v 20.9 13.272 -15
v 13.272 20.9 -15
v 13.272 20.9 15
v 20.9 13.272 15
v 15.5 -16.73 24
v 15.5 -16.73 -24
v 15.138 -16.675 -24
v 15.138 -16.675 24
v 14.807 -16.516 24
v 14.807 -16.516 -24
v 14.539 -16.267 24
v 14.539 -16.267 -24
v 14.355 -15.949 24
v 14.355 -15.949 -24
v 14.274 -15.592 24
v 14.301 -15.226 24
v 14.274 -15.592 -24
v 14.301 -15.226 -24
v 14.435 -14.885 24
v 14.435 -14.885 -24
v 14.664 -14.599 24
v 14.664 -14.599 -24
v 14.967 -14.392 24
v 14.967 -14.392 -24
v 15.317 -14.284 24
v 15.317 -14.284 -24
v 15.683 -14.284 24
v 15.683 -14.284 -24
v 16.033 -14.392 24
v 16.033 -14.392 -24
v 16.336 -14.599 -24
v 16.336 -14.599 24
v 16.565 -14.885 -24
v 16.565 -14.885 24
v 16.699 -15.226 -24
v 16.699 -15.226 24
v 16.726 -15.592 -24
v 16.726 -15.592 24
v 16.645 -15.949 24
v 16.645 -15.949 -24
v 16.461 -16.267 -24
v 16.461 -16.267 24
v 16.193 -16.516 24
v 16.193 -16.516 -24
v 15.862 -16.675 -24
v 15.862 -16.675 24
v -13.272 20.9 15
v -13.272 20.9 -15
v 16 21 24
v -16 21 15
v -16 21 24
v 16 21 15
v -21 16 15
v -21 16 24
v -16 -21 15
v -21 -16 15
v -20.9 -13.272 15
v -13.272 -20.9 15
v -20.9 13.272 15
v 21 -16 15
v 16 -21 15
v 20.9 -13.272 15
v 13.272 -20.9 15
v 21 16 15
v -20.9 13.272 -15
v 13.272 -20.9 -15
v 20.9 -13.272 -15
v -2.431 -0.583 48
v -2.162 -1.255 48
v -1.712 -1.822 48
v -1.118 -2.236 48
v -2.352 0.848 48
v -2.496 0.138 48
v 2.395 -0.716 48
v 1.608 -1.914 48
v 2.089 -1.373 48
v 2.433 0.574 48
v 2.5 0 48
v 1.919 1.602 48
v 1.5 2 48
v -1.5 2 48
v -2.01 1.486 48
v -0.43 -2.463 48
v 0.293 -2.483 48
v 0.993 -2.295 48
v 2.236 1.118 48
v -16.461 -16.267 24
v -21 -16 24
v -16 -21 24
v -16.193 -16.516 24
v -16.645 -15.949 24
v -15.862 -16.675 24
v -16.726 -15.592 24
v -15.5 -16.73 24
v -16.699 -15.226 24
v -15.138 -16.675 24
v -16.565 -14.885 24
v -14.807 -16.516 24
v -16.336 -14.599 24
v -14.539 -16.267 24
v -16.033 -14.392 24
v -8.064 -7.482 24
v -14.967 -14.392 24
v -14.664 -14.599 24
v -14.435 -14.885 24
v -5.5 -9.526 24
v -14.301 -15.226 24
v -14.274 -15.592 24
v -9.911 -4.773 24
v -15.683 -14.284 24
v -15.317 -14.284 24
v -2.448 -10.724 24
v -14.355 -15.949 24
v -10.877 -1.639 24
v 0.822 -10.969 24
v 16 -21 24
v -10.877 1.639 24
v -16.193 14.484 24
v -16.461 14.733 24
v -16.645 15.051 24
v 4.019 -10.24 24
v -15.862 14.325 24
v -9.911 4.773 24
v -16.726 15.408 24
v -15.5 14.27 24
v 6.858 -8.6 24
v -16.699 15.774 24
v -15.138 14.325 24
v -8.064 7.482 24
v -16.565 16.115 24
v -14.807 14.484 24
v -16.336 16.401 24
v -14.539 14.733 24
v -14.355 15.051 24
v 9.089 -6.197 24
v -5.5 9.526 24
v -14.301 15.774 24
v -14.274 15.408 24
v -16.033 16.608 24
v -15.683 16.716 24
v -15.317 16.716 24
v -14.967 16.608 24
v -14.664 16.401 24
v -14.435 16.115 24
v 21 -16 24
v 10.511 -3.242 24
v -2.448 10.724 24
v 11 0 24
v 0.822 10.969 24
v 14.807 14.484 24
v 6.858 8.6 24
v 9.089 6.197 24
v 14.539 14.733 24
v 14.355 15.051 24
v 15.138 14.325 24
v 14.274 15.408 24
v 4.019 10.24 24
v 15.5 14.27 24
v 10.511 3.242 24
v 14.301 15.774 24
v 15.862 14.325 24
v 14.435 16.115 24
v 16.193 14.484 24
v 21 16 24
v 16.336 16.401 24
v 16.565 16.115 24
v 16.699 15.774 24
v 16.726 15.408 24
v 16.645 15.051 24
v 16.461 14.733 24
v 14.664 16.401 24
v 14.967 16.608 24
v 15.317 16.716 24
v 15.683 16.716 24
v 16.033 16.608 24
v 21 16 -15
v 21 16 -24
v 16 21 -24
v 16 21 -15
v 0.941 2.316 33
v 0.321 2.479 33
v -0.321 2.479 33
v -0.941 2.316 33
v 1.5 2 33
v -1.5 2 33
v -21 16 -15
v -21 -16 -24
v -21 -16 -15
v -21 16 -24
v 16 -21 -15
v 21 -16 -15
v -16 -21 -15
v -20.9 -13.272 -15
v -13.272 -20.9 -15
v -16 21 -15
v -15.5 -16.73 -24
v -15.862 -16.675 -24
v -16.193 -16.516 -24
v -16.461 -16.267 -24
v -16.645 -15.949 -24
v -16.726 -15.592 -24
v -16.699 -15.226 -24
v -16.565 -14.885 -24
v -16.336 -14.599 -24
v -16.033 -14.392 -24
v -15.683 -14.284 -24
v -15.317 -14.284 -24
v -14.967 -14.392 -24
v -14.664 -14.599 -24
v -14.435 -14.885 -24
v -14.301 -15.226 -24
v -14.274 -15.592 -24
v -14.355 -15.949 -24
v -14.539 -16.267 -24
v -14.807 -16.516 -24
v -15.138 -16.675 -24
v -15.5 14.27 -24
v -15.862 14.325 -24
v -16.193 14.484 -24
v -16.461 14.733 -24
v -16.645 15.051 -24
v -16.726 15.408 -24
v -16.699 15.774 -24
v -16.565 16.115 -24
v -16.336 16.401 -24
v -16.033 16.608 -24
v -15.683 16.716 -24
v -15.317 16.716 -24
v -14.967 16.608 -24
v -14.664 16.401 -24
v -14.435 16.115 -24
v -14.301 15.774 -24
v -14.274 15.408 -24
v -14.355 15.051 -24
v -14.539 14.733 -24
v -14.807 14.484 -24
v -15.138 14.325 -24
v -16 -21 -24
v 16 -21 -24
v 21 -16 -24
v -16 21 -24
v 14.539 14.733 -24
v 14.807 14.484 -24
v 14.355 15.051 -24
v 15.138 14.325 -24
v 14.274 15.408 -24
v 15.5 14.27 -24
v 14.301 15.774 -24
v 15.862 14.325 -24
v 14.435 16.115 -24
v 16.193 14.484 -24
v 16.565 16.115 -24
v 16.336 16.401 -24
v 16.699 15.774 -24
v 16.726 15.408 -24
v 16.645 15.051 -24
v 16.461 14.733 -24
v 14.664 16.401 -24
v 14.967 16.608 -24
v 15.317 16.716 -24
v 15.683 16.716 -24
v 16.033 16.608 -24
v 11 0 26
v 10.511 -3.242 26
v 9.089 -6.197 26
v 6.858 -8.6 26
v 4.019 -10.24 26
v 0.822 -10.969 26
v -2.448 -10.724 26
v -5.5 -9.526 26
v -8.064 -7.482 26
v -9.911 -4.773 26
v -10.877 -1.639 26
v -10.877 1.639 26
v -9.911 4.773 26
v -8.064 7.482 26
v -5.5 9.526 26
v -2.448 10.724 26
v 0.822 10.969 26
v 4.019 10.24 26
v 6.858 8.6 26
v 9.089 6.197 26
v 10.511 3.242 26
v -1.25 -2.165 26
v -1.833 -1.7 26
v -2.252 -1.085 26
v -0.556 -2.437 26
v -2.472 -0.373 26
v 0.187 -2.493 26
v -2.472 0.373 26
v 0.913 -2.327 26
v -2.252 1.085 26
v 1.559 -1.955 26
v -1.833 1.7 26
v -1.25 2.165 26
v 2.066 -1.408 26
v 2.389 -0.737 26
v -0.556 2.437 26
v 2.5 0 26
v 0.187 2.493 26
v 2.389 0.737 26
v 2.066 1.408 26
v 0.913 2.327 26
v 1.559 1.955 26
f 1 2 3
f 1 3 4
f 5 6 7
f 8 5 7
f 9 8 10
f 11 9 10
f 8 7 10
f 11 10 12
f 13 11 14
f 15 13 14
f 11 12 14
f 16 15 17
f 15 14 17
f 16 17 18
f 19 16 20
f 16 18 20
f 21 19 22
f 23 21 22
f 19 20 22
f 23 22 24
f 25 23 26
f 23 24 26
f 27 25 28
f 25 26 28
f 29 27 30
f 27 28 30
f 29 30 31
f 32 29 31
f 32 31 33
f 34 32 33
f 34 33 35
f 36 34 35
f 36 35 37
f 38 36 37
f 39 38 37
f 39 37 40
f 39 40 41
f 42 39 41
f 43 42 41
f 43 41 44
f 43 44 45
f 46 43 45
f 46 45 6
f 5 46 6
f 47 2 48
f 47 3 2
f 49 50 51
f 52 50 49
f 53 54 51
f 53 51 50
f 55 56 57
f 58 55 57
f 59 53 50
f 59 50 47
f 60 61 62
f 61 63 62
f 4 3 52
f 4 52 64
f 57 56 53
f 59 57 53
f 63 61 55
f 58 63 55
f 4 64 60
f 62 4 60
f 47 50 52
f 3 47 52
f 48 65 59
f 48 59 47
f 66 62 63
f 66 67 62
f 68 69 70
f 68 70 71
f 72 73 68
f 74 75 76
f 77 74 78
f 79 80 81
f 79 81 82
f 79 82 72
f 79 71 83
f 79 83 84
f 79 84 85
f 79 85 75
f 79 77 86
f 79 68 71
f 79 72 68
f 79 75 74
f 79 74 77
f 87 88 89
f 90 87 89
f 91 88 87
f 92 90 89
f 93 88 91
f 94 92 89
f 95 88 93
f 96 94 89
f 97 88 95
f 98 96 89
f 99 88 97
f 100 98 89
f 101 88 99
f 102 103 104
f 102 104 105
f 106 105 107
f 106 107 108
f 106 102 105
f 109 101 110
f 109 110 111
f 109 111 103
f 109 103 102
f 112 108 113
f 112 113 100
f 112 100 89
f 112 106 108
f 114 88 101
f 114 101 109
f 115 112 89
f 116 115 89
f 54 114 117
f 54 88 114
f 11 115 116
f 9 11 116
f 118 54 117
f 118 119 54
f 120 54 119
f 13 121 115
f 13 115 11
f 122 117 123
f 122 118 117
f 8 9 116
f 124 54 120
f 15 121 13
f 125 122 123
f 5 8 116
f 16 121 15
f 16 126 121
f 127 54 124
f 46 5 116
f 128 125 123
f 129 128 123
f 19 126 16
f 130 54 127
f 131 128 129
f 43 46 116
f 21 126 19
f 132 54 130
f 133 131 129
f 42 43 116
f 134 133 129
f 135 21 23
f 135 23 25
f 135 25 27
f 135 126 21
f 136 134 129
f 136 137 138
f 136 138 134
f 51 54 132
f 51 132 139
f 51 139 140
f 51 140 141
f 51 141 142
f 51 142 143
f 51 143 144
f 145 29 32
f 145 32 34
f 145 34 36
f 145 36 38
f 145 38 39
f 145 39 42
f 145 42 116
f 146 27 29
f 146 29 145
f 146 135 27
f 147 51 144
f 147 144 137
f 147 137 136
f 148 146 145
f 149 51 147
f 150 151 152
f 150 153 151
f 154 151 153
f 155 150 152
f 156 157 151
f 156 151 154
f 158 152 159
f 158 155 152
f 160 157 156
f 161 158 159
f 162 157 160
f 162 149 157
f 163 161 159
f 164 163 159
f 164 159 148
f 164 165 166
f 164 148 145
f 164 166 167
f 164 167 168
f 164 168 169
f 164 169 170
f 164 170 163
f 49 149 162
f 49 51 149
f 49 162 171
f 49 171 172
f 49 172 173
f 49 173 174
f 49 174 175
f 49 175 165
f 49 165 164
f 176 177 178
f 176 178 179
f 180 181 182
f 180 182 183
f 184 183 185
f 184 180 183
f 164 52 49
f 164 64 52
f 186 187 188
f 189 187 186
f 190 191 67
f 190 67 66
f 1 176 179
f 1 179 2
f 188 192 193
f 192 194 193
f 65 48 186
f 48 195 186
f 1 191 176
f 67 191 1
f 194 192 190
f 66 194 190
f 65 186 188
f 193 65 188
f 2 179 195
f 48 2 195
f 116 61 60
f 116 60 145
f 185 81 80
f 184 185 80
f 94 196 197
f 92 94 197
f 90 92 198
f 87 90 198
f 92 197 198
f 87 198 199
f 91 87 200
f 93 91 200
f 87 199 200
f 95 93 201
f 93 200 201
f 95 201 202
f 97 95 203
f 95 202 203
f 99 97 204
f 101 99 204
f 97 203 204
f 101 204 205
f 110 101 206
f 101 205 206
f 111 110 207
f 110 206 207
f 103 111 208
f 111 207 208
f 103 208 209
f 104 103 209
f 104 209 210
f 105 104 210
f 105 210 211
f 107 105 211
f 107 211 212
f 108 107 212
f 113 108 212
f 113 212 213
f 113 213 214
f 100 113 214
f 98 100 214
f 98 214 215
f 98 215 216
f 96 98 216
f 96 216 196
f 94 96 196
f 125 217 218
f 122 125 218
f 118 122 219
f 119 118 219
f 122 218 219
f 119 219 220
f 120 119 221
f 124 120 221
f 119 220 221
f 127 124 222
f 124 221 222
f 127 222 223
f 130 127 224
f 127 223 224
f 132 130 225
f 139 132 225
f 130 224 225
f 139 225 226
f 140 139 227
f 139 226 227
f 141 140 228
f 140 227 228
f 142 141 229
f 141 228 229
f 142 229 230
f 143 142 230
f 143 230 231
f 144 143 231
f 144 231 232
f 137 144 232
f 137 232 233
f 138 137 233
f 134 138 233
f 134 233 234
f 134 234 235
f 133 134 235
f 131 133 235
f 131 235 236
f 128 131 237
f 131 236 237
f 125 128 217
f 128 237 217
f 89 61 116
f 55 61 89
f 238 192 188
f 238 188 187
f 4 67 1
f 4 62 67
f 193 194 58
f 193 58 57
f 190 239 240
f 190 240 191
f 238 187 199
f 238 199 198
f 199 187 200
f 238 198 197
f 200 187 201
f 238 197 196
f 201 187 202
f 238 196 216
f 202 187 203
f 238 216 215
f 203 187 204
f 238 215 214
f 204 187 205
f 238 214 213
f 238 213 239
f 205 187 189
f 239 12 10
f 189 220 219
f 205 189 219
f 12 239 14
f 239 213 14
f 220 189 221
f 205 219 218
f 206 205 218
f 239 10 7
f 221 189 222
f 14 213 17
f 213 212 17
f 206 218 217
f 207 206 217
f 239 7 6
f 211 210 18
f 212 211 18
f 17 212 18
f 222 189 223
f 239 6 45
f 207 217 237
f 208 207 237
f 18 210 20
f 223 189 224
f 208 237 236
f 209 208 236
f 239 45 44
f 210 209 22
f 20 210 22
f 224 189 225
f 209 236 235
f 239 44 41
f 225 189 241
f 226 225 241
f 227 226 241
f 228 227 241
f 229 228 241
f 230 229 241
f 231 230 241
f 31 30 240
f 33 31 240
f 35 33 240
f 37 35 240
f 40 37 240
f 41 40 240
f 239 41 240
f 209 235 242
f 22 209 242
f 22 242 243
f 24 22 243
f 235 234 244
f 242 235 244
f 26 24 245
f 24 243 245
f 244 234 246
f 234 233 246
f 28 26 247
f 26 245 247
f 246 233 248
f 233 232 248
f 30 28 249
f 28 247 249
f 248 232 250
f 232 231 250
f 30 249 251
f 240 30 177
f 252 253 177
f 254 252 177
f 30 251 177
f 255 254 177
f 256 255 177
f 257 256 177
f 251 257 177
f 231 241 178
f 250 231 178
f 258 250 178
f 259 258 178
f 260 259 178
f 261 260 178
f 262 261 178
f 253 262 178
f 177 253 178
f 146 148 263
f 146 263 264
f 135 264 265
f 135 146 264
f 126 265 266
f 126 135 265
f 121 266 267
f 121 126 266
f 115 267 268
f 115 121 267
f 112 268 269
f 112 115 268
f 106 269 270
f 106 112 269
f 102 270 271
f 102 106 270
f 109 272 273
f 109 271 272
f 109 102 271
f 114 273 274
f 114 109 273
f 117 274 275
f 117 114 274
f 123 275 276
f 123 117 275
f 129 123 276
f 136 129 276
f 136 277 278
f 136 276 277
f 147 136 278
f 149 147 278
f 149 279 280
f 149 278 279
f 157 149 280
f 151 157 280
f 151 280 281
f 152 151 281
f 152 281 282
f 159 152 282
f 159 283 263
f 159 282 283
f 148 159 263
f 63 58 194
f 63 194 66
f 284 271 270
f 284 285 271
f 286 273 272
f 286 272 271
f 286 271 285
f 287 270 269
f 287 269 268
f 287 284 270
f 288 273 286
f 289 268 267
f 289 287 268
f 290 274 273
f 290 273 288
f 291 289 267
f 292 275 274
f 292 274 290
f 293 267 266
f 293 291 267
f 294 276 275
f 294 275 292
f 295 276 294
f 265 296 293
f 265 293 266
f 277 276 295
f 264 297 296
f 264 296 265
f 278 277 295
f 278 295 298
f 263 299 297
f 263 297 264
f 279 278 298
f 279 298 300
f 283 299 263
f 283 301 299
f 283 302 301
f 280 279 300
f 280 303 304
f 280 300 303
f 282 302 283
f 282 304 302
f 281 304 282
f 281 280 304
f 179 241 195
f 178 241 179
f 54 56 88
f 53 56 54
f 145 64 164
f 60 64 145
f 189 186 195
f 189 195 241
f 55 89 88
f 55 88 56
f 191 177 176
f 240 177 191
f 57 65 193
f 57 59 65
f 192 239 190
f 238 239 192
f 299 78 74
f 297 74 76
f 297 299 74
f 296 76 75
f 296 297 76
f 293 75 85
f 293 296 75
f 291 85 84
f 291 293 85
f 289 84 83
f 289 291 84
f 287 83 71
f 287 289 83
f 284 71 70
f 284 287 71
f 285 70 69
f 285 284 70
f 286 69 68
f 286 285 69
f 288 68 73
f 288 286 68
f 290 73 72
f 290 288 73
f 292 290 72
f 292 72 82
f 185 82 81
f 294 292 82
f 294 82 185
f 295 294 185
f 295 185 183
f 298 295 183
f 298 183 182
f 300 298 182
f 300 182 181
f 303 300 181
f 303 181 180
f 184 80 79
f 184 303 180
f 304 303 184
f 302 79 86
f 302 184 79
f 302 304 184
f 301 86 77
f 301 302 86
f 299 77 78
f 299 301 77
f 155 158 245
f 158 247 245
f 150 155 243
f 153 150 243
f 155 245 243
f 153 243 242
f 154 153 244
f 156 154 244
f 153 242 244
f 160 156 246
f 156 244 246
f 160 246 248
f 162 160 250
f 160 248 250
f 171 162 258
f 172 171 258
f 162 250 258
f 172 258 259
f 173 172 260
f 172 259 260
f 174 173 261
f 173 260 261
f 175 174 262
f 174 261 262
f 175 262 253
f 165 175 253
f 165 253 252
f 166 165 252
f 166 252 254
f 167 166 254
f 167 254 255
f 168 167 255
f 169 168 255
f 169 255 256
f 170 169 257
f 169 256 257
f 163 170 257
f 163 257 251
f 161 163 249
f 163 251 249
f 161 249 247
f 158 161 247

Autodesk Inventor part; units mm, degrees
ref_plane "YZ Plane" through (0, 0, 0) normal (1, 0, 0) x (0, 1, 0)
ref_plane "XZ Plane" through (0, 0, 0) normal (0, 1, 0) x (-1, 0, 0)
ref_plane "XY Plane" through (0, 0, 0) normal (0, 0, 1) x (1, 0, 0)
sketch "Sketch1" plane through (0, 0, 0) normal (0, 0, 1) x (1, 0, 0)
  line L0 (-21, 21) -> (21, 21)
  line L1 (21, 21) -> (21, -21)
  line L2 (21, -21) -> (-21, -21)
  line L3 (-21, -21) -> (-21, 21)
  point P0 (0, 0)
  point P1 (0, 0)
  dimension "d0" = 42
extrude "Extrusion1" add sketch "Sketch1" along normal mid plane 48
sketch "Sketch2" plane through (0, 0, 24) normal (0, 0, 1) x (1, 0, 0)
  circle A0 centre (0, 0) radius 11
  dimension "d3" = 22
extrude "Extrusion2" add sketch "Sketch2" along normal blind 2
sketch "Sketch3" plane through (0, 0, 26) normal (0, 0, 1) x (1, 0, 0)
  circle A0 centre (0, 0) radius 11 projected
  circle A1 centre (0, 0) radius 2.5
  dimension "d7" = 5
extrude "Extrusion3" add sketch "Sketch3" along normal blind 22 contours A1
sketch "Sketch4" plane through (0, 0, 48) normal (0, 0, 1) x (1, 0, 0)
  circle A0 centre (0, 0) radius 2.5 projected
  line L0 (-1.5, 2) -> (1.5, 2)
  dimension "d11" = 2
extrude "Extrusion4" cut sketch "Sketch4" against normal blind 15 contours L0 A0 picked at (-0.3466, 2.0912)
sketch "Sketch5" plane through (0, 0, 24) normal (0, 0, 1) x (1, 0, 0)
  circle A0 centre (0, 0) radius 11 projected
  line L0 (-15.5, 15.5) -> (15.5, 15.5)
  line L1 (15.5, 15.5) -> (15.5, -15.5)
  line L2 (15.5, -15.5) -> (-15.5, -15.5)
  line L3 (-15.5, -15.5) -> (-15.5, 15.5)
  dimension "d14" = 31
hole "Hole1" at (-15.5, 15.5, 24) at (15.5, 15.5, 24) at (15.5, -15.5, 24) at (-15.5, -15.5, 24) direction (0, 0, -1) diameter 2.459 end through all thread size "M3x0.5" class "6H" standard "ANSI Metric M Profile"
chamfer "Chamfer1" distance 5 angle 45 4 edges at (21, 21, 0) (-21, 21, 0) (21, -21, 0) (-21, -21, 0)
sketch "Sketch6" plane through (0, 0, 0) normal (0, 0, 1) x (1, 0, 0)
  line L0 (-21, 16) -> (-16, 21) projected
  line L1 (-16, 21) -> (16, 21) projected
  line L2 (16, 21) -> (21, 16) projected
  line L3 (21, 16) -> (21, -16) projected
  line L4 (21, -16) -> (16, -21) projected
  line L5 (16, -21) -> (-16, -21) projected
  line L6 (-16, -21) -> (-21, -16) projected
  line L7 (-21, -16) -> (-21, 16) projected
  circle A0 centre (15.5, -15.5) radius 1.2295 projected
  circle A1 centre (-15.5, 15.5) radius 1.2295 projected
  circle A2 centre (15.5, 15.5) radius 1.2295 projected
  circle A3 centre (-15.5, -15.5) radius 1.2295 projected
  line L8 (-21, 13.1716) -> (-13.1716, 21)
  point P0 (0, 0)
  dimension "d25" = 2
extrude "Extrusion5" cut sketch "Sketch6" along normal mid plane 30 contours L0 L1 L8 L7
pattern_circular "Circular Pattern1" count 4 over 360 about axis through (0, 0, 26) along (0, 0, 1) of "Extrusion5"
sketch "Sketch7" plane through (-16, -21, 24) normal (0, -1, 0) x (1, 0, 0)
  line L0 (-5, -39) -> (-5, -9) projected
  line L1 (-5, -39) -> (2.8284, -39) projected
  line L2 (2.8284, -9) -> (2.8284, -39) projected
  line L3 (2.8284, -9) -> (-5, -9) projected
  line L4 (29.1716, -39) -> (29.1716, -9) projected
  line L5 (29.1716, -39) -> (37, -39) projected
  line L6 (37, -9) -> (37, -39) projected
  line L7 (37, -9) -> (29.1716, -9) projected
  line L8 (-5, -9) -> (37, -9)
  line L9 (37, -9) -> (37, -39)
  line L10 (37, -39) -> (-5, -39)
  line L11 (-5, -39) -> (-5, -9)
  point P0 (16, -24)
extrude "Extrusion6" cut sketch "Sketch7" against normal blind 0.1
pattern_circular "Circular Pattern2" count 4 over 360 about axis through (0, 0, 26) along (0, 0, 1) of "Extrusion6"
properties part number "stepper"
